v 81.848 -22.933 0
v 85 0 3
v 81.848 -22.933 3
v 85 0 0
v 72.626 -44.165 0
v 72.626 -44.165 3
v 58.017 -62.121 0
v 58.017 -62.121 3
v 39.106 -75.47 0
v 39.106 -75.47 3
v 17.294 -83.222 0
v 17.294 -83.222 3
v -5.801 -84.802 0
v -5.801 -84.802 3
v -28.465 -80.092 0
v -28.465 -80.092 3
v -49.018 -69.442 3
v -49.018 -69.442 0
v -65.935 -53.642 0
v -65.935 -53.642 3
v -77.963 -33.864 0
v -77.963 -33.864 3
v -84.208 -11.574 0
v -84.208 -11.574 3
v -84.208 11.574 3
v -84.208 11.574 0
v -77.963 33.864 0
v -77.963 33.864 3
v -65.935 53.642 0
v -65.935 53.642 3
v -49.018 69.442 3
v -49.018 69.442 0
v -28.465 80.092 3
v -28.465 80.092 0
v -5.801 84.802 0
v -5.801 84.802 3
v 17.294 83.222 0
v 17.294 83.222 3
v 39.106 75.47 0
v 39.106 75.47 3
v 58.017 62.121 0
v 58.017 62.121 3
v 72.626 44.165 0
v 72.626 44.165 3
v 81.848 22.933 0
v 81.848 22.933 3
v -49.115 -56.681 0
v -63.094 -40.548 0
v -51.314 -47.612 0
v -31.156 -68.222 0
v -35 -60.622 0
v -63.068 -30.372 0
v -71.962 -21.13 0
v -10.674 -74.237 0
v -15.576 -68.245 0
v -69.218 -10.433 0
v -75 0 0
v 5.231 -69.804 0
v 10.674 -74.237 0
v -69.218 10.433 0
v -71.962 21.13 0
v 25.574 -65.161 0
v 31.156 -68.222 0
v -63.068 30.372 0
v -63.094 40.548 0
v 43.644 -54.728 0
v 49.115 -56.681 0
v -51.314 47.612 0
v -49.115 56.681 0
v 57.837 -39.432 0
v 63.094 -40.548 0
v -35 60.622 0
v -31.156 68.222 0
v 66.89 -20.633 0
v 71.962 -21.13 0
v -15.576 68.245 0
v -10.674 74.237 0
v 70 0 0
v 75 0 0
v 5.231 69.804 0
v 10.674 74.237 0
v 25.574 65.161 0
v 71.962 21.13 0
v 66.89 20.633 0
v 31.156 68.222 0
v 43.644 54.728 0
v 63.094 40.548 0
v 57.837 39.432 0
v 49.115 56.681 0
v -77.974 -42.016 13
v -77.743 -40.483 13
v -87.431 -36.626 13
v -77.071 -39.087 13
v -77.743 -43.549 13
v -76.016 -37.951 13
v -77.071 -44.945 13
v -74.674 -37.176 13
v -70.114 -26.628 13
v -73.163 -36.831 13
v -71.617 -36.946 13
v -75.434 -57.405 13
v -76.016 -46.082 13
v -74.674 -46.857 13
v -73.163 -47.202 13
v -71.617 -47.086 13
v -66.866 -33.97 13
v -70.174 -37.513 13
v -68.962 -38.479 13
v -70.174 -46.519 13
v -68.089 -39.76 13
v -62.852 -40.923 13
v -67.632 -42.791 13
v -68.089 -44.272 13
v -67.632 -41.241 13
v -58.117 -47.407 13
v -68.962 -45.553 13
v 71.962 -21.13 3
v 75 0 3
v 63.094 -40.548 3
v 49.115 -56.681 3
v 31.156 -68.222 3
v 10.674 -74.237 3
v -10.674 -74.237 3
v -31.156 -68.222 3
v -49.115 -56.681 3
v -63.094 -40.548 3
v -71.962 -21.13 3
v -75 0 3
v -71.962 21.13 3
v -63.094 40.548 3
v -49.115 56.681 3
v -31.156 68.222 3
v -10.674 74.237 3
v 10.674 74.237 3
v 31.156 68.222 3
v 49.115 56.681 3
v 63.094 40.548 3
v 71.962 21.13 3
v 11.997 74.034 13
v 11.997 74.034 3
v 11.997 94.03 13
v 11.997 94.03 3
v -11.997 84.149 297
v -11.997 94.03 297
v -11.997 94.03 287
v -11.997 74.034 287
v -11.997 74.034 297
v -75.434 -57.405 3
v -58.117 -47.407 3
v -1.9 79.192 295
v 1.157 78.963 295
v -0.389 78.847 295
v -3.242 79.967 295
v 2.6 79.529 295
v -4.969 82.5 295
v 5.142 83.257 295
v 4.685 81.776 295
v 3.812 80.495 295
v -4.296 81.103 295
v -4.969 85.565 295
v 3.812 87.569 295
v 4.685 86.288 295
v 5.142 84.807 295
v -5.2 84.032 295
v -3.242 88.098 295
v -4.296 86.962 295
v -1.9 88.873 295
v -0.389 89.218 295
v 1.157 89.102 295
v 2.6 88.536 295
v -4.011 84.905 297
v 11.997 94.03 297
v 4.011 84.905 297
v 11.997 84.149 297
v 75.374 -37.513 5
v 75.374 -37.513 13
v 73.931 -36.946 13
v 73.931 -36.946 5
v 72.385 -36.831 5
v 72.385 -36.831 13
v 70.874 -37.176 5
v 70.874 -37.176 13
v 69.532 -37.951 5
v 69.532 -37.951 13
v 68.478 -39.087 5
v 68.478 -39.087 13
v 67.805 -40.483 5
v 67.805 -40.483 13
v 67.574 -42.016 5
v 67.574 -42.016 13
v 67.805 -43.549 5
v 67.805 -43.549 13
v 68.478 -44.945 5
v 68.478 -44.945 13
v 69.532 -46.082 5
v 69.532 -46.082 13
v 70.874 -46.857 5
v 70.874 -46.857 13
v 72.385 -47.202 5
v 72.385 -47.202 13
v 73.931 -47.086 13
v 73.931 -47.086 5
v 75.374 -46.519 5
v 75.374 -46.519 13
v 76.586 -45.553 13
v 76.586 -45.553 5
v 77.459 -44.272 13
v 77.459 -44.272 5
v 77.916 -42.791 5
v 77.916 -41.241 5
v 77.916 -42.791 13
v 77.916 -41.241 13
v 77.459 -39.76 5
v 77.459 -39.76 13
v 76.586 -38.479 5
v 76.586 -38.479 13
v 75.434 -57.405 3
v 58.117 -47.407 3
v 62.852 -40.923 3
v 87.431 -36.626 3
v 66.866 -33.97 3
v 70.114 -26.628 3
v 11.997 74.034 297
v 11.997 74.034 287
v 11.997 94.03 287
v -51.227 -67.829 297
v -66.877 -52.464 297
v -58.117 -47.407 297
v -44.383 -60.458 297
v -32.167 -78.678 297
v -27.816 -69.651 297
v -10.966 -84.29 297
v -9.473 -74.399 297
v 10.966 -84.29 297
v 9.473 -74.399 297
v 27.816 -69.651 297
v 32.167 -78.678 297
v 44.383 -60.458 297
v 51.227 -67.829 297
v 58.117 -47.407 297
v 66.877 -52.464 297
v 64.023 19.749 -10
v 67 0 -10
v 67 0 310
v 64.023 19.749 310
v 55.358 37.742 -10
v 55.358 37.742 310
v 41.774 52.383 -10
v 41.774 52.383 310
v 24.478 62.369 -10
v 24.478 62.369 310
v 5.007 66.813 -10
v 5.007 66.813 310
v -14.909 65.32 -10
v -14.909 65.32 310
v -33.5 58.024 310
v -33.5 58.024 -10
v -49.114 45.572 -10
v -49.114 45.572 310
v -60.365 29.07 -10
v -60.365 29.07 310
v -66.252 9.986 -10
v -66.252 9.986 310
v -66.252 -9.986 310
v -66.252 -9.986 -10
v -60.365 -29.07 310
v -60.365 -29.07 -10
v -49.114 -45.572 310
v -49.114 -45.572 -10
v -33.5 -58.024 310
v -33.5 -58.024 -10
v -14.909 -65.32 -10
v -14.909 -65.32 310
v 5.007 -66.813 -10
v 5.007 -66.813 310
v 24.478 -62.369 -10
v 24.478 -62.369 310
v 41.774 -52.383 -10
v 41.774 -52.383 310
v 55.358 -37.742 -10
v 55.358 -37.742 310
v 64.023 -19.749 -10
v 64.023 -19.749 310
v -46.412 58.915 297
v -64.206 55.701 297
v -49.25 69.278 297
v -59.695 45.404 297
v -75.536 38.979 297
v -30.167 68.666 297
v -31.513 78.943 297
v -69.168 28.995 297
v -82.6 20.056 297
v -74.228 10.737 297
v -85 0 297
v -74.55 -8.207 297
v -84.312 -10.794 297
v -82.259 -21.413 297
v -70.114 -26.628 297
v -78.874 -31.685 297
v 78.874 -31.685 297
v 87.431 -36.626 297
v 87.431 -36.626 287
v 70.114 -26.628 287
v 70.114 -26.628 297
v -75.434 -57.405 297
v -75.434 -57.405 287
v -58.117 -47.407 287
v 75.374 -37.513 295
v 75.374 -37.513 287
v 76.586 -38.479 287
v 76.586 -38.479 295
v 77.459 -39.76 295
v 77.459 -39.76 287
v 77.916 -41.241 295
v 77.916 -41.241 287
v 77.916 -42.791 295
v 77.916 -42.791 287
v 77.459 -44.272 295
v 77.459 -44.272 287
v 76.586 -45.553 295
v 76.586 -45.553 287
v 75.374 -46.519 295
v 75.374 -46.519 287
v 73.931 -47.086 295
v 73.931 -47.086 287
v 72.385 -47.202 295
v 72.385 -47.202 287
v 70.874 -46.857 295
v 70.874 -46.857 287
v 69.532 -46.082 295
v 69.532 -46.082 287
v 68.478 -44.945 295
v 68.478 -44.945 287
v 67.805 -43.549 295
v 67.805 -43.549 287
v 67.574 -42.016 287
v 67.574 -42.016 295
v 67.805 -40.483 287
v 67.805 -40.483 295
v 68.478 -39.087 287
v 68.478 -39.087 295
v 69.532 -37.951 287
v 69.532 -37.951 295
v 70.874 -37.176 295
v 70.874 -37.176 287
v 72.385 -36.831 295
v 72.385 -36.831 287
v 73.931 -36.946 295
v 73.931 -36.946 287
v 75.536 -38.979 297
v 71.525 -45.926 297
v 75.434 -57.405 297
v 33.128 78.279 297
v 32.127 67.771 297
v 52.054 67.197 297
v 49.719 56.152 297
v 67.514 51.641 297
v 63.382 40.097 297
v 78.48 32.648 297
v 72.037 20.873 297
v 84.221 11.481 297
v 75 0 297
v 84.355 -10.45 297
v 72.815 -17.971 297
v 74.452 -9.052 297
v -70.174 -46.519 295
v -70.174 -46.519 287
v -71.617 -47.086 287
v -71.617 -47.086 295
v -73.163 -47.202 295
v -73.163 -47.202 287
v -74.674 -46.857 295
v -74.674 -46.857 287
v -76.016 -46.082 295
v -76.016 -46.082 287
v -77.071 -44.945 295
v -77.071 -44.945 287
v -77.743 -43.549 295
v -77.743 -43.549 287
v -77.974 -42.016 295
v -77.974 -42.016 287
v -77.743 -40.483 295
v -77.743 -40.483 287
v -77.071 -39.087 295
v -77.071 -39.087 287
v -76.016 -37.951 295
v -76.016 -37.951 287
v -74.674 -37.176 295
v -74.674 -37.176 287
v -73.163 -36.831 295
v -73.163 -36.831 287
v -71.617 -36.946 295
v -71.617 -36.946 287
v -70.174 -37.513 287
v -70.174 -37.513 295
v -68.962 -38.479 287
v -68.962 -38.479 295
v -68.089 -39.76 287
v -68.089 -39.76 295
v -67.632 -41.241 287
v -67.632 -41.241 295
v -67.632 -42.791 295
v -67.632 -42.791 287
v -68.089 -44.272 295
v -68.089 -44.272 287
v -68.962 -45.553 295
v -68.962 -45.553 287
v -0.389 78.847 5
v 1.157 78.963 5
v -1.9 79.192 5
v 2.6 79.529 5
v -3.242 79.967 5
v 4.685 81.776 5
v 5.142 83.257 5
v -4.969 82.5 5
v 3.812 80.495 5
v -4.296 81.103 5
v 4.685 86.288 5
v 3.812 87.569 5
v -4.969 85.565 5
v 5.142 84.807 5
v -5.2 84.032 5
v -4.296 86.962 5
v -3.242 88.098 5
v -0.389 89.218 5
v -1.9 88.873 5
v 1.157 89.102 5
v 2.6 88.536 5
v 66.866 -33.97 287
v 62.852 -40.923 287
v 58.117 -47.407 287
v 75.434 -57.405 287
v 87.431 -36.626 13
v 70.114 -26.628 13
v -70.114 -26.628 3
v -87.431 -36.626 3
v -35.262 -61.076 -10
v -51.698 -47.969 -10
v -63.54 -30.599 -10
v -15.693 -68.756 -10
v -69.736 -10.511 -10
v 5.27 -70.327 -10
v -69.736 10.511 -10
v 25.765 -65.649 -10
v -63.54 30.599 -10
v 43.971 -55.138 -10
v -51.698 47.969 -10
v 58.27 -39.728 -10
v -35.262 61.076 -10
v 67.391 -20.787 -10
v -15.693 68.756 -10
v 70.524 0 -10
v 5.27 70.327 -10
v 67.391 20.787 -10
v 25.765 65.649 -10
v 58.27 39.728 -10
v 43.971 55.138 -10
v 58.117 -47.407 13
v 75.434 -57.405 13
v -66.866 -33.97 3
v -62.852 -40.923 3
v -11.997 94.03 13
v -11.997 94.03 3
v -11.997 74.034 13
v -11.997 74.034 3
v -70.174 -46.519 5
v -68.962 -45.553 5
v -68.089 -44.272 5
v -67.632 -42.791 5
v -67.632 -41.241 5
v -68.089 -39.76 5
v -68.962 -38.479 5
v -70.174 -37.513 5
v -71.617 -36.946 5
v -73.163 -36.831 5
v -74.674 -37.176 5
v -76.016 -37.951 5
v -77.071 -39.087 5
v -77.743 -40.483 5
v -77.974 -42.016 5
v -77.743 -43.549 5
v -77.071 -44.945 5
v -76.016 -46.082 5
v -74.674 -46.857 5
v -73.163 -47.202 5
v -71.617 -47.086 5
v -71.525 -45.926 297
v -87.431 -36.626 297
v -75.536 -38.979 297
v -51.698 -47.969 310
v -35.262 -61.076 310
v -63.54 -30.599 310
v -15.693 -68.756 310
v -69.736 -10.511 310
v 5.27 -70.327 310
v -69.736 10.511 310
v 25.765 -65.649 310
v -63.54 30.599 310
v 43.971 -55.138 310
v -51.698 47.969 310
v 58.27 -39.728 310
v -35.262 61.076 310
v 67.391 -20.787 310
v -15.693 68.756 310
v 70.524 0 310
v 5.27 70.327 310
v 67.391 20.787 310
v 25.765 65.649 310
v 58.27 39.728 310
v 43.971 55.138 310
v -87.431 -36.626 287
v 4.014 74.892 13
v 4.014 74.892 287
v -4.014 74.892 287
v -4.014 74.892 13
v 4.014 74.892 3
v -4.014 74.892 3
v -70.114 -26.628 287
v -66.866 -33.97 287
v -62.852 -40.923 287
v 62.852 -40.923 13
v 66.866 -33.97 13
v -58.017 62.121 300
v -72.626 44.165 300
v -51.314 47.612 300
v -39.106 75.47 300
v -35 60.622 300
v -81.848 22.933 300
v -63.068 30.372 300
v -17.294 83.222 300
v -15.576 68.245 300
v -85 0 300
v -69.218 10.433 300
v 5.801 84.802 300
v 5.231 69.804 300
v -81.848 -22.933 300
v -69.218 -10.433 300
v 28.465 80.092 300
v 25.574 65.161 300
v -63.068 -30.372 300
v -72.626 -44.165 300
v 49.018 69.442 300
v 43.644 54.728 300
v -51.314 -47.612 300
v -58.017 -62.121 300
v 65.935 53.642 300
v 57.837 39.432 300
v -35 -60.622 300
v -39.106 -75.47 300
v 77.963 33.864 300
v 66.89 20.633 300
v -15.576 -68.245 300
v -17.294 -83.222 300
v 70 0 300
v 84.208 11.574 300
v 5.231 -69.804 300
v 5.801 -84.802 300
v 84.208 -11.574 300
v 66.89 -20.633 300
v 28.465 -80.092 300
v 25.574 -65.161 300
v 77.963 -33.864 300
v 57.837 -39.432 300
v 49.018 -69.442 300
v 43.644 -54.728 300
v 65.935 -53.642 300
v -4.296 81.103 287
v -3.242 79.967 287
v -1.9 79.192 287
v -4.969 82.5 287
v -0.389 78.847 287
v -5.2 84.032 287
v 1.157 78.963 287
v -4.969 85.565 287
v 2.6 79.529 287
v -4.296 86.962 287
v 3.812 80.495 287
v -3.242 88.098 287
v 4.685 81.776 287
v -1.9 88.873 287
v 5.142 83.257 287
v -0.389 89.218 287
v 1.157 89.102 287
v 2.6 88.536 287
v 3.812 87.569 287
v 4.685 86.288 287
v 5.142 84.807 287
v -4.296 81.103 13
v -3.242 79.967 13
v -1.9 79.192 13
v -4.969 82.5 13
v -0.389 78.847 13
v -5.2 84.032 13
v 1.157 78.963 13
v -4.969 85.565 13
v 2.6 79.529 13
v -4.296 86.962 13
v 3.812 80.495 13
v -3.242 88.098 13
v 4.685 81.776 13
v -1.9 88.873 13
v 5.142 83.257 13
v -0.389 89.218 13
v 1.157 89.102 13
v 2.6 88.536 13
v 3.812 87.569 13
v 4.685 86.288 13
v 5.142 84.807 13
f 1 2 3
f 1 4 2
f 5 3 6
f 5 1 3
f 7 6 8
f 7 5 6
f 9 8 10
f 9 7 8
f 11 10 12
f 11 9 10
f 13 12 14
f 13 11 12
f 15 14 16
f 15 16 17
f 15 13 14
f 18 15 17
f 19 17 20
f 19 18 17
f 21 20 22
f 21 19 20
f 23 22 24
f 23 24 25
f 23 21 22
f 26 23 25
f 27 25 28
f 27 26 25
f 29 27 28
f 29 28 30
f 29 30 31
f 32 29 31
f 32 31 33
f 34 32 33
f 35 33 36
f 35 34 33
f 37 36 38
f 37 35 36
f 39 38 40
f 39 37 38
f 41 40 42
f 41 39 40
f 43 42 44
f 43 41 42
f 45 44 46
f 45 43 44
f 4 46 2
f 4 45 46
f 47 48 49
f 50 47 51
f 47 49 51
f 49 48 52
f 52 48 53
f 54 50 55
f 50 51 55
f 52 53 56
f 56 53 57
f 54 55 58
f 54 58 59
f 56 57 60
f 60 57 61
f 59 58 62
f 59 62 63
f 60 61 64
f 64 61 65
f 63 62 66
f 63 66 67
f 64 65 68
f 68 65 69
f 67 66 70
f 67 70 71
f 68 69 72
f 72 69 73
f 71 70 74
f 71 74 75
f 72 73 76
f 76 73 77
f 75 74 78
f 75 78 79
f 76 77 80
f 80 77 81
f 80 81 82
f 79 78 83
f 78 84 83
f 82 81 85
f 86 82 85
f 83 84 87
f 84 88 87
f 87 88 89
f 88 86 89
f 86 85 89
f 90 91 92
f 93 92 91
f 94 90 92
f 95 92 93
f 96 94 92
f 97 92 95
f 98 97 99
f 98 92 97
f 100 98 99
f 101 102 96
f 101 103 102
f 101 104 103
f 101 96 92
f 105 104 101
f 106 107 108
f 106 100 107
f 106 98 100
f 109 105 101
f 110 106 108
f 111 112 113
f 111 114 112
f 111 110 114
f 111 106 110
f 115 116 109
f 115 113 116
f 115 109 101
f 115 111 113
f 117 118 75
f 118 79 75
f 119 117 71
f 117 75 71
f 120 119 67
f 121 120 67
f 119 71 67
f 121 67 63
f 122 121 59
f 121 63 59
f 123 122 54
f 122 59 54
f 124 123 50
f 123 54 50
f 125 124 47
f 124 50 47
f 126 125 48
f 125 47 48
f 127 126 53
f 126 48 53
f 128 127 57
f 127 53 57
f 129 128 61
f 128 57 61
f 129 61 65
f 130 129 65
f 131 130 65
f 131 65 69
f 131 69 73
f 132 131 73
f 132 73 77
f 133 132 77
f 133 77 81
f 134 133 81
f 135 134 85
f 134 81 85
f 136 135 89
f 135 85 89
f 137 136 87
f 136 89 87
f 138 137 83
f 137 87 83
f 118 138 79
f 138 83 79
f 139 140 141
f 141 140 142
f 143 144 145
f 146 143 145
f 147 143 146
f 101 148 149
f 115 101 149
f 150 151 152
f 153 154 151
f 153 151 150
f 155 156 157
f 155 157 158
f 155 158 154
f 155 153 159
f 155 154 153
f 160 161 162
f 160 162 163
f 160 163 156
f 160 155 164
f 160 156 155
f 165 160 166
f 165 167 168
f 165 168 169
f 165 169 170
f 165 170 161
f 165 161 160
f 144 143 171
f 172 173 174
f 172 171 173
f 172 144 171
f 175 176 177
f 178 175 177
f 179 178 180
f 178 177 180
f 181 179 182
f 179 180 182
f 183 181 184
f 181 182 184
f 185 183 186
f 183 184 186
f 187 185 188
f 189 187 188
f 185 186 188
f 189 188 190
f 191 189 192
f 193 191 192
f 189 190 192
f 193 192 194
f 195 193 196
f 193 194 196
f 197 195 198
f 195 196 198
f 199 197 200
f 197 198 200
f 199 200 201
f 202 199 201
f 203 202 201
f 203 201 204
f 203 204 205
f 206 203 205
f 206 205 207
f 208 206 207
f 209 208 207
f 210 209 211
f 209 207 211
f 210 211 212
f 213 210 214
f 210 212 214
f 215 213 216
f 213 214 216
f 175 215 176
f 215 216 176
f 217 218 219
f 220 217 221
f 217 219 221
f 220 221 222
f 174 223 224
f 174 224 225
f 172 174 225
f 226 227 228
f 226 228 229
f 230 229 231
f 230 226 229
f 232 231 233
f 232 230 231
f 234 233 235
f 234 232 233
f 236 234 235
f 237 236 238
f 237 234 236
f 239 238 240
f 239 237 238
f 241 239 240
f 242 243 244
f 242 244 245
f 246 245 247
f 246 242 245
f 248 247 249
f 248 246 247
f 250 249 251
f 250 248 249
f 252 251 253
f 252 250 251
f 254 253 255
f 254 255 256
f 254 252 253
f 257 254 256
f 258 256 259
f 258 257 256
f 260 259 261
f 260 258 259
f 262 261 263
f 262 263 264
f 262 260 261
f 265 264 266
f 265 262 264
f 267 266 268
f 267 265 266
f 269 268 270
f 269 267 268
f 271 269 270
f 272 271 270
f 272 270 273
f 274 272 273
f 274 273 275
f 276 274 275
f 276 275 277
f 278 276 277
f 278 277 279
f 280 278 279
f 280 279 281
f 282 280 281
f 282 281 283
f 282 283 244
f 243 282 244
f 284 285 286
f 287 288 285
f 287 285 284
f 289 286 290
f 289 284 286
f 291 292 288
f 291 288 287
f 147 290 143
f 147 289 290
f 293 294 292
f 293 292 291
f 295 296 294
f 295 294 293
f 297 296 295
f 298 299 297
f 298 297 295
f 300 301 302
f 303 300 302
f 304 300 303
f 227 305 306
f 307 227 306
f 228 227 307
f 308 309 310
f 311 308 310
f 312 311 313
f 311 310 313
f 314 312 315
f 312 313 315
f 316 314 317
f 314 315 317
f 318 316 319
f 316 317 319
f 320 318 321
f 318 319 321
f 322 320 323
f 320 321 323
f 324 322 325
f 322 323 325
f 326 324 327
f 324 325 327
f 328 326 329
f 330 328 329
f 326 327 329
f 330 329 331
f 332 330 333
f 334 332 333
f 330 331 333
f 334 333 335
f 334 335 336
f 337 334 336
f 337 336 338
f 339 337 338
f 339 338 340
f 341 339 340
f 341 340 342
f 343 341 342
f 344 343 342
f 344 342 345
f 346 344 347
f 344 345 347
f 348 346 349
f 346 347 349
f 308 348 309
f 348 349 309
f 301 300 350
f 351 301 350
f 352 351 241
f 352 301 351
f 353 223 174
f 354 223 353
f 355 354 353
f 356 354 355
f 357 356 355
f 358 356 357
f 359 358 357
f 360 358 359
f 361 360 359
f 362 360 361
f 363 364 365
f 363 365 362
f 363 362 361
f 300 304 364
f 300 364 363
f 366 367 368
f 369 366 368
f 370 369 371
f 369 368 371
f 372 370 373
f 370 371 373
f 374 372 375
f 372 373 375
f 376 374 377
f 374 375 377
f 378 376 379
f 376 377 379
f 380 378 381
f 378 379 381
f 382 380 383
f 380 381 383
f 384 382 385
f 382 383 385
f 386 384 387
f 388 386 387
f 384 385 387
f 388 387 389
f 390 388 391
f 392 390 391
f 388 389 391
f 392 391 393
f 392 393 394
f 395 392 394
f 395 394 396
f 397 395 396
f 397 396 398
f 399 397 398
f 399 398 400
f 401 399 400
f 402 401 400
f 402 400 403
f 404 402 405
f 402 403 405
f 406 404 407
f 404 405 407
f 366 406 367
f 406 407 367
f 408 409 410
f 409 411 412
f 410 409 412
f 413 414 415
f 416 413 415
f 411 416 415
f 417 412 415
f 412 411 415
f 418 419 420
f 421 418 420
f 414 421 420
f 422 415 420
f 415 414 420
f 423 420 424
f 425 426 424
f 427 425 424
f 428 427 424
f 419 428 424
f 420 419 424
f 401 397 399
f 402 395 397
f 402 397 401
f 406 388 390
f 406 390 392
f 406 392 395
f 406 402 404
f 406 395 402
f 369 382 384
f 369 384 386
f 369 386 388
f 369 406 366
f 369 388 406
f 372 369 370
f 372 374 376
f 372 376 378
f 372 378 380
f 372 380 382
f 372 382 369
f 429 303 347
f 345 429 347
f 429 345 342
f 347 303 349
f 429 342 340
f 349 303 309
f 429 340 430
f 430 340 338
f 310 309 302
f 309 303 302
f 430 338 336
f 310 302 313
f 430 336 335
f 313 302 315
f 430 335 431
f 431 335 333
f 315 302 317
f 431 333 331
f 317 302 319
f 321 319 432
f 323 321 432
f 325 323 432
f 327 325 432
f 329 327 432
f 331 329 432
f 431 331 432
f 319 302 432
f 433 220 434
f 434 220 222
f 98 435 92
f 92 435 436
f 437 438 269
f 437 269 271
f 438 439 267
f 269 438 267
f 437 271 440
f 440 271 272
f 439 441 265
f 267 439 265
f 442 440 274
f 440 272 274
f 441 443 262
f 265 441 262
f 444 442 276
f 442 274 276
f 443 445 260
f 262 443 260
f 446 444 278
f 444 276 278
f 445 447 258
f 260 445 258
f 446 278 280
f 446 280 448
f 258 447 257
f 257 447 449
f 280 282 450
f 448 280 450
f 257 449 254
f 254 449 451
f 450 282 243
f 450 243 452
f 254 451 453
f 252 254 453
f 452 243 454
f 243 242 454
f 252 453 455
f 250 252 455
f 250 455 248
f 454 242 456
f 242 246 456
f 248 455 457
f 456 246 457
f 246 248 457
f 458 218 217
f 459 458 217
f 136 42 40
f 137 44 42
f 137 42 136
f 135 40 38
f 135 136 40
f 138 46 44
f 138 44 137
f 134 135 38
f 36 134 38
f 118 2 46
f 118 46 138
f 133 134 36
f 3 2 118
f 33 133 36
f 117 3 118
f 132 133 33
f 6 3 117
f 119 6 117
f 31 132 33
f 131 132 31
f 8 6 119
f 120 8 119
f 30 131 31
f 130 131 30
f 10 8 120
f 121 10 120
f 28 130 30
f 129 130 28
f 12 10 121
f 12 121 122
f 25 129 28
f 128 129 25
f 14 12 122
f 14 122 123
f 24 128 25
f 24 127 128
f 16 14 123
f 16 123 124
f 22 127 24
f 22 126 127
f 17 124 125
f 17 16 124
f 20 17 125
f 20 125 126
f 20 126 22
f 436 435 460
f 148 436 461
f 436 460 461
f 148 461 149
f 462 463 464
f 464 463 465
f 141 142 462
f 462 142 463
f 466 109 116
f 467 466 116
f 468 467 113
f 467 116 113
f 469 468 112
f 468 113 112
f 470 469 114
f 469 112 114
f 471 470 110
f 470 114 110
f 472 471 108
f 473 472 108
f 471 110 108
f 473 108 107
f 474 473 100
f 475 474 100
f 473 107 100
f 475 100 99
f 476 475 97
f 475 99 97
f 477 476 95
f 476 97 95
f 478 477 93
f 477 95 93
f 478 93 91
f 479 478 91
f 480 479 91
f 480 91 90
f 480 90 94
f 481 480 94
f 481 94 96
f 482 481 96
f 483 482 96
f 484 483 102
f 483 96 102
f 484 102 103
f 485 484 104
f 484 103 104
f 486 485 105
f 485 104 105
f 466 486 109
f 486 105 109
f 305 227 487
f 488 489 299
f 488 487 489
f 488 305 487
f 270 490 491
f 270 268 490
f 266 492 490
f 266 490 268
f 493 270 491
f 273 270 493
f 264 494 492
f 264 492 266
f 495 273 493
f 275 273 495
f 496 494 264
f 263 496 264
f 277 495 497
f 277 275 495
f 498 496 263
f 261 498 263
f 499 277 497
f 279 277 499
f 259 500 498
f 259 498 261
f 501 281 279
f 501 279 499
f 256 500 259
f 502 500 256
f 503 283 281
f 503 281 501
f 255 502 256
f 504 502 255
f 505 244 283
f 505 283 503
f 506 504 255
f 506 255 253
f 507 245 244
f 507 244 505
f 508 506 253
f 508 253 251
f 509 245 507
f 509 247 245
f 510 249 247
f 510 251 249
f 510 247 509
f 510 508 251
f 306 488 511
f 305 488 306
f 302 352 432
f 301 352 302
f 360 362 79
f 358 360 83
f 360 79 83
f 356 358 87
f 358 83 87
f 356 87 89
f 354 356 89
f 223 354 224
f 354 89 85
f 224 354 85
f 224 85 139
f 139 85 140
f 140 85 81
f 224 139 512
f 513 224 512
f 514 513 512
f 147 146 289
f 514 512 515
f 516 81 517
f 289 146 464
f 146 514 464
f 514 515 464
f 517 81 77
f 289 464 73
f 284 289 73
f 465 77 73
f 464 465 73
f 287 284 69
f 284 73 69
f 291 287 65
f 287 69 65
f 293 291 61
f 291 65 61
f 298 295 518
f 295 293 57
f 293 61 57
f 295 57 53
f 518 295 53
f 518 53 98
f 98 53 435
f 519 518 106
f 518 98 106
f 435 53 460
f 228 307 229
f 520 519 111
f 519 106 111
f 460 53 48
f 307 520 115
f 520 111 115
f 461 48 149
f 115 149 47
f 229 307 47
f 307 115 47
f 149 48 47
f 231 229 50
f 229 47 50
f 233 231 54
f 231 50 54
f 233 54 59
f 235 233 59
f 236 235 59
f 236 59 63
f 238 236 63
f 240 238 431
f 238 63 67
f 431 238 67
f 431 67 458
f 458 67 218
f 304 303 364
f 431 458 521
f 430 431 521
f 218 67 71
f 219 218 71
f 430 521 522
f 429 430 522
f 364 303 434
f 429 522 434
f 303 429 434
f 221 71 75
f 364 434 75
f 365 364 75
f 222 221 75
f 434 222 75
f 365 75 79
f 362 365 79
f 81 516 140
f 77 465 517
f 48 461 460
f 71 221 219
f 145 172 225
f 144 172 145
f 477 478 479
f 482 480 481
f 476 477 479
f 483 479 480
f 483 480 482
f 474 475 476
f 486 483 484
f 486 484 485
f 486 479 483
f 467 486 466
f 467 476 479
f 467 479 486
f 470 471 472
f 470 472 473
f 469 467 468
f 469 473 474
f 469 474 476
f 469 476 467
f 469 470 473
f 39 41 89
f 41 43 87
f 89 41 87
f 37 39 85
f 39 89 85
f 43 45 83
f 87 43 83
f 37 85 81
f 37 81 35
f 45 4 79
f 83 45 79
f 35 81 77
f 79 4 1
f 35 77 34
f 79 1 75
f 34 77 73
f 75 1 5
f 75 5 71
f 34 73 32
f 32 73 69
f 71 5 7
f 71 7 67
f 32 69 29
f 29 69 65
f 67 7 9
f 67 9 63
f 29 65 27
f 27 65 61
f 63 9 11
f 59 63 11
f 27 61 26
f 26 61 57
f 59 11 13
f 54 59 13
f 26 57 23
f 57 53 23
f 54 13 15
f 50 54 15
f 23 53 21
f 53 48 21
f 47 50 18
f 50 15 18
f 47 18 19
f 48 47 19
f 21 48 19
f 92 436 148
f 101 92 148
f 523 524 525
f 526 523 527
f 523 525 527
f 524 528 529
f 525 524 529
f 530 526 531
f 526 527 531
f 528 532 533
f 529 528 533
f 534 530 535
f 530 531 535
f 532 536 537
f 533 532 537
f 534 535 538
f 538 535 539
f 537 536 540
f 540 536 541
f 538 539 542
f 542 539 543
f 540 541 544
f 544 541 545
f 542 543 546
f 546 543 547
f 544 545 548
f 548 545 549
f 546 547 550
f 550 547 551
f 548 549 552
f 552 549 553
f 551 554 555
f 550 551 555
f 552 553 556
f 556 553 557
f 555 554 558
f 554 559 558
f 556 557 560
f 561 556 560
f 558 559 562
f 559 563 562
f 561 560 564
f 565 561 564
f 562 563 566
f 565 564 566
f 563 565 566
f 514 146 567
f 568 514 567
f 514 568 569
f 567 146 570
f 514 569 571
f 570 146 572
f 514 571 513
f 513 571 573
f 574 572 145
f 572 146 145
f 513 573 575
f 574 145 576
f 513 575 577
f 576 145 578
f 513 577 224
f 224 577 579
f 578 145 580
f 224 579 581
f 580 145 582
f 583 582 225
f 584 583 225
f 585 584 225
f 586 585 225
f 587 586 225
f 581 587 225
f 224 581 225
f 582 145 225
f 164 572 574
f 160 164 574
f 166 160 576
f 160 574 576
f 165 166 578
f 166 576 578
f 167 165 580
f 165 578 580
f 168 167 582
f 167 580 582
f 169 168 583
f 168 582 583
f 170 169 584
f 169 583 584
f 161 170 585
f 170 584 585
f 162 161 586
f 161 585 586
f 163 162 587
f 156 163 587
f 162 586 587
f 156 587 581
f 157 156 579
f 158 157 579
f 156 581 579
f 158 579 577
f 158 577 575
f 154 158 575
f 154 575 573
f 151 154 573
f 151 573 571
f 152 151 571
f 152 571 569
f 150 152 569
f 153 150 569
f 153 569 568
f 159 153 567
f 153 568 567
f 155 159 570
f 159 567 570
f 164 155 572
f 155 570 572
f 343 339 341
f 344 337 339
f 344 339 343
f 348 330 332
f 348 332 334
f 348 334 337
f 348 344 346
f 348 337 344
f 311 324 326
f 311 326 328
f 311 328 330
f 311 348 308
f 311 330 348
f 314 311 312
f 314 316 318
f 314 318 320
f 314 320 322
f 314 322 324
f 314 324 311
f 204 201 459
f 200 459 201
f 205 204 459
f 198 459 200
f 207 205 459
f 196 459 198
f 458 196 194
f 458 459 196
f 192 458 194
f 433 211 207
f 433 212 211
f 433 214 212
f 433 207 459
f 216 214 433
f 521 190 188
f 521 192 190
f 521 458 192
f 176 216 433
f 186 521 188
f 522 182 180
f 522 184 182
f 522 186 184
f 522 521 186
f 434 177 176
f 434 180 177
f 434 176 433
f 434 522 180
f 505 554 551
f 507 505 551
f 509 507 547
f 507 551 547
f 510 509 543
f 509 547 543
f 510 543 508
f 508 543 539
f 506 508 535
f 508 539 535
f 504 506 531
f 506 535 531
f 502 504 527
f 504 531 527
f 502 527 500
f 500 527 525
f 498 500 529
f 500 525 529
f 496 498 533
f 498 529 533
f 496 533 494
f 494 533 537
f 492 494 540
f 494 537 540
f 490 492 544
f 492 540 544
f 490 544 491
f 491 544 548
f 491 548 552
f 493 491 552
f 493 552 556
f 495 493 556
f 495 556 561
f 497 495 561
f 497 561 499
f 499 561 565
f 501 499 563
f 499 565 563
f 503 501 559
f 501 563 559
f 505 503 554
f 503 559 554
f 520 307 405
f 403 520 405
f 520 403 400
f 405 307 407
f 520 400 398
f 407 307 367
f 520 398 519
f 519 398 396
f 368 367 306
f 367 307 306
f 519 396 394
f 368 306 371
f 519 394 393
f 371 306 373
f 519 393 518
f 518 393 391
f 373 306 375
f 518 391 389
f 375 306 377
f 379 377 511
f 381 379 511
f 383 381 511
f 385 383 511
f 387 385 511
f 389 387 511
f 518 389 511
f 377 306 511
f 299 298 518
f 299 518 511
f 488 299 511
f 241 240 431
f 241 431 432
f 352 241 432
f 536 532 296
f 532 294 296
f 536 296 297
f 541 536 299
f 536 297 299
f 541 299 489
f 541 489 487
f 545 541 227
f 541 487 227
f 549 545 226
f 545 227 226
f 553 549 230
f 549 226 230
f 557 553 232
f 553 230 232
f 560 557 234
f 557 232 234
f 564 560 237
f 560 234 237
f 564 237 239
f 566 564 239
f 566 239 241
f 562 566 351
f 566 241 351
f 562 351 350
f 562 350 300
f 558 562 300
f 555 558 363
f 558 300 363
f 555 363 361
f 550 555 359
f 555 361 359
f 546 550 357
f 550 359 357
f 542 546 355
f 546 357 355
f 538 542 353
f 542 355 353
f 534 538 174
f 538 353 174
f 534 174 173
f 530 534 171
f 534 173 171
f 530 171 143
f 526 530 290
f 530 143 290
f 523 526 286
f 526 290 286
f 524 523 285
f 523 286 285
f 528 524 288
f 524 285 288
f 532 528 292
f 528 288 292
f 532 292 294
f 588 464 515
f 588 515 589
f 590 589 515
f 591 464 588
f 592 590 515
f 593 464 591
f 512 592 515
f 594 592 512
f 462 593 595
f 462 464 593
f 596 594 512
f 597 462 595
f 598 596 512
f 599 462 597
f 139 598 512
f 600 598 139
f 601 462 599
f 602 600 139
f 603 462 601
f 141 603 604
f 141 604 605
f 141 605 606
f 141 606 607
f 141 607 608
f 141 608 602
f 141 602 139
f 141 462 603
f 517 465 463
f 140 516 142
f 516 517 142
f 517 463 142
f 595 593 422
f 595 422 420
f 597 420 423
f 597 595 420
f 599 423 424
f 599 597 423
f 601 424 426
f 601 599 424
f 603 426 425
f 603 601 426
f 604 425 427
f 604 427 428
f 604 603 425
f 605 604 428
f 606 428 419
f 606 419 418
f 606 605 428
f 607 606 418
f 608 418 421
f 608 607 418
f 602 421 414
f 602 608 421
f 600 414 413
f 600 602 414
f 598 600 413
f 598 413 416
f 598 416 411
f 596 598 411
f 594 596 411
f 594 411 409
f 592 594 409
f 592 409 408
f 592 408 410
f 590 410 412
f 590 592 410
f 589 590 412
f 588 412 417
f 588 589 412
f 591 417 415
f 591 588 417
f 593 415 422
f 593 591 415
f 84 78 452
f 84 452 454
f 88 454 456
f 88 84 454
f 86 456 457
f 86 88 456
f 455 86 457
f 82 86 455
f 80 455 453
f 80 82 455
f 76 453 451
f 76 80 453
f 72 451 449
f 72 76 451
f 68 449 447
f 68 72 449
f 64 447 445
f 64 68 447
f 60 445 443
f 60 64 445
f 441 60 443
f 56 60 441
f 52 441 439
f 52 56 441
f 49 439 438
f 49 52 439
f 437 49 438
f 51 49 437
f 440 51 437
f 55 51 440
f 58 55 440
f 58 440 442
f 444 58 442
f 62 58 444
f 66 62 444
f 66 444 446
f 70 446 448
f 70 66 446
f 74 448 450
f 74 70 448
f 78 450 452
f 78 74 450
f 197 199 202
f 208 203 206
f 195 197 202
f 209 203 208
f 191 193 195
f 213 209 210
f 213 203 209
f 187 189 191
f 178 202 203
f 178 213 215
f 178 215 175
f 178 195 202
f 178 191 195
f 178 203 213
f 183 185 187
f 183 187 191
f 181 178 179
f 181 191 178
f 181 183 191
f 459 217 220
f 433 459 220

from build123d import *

# Parameters (mm, degrees)
SKETCH3_R                         = 75
MAIN_BODY_DEPTH                   = 300
SKETCH16_R                        = 70
EXTENSION_1_DEPTH                 = 10
EXTENSION_1_DRAFT                 = -3
SKETCH23_R                        = 67
CUT_EXTRUDE11_DEPTH               = 333
SKETCH35_W                        = 3
SKETCH35_H                        = 10
SKETCH37_W                        = 3
SKETCH37_H                        = 10
SKETCH46_R                        = 70
EXTENSION_2_DEPTH                 = 10
EXTENSION_2_DRAFT                 = 3
CUT_EXTRUDE16_DEPTH               = 34
CUT_EXTRUDE16_DEPTH_BACK          = 64
SKETCH47_R                        = 67
RODEHOLDER_DEPTH                  = 10
SKETCH55_R                        = 5.2
RODEHOLDERHOLE_DEPTH              = 8
RODEHOLDERPATTERN_COUNT           = 3
RODEHOLDERPATTERN_COPY_1_DEPTH    = 10
RODEHOLDERPATTERN_COPY_2_DEPTH    = 10
RODEHOLDERPATTERN_COPY_3_SKETCH_R = 5.2
RODEHOLDERPATTERN_COPY_3_DEPTH    = 8
RODEHOLDERPATTERN_COPY_4_SKETCH_R = 5.2
RODEHOLDERPATTERN_COPY_4_DEPTH    = 8


with BuildPart() as part:
    # Sketch3 → Main Body (new body)
    with BuildSketch(Plane.XY):
        Circle(SKETCH3_R)
    extrude(amount=MAIN_BODY_DEPTH)


with BuildPart() as extension_1_tool:
    # Sketch16 → Extension 1 (with draft: the straight prism first)
    with BuildSketch(Plane.XY.offset(300)):
        Circle(SKETCH16_R)
    extrude(amount=EXTENSION_1_DEPTH)
    # Extension 1: the draft: its side faces are tilted about the plane it starts from
    extension_1_sides = [extension_1_tool.faces().sort_by_distance(p)[0] for p in [
        (-70, 0, 305),
    ]]
    draft(extension_1_sides, Plane.XY.offset(300), EXTENSION_1_DRAFT)


with BuildPart() as part_1:
    add(part.part)

    # Extension 1: add extension_1_tool
    add(extension_1_tool.part)

    # Sketch23 → Cut-Extrude11 (cut)
    with BuildSketch(Plane.XY.offset(310)):
        Circle(SKETCH23_R)
    extrude(amount=-CUT_EXTRUDE11_DEPTH, mode=Mode.SUBTRACT)


with BuildPart() as body_2:
    # Sketch35 → Revolve7 (revolve)
    with BuildSketch(Plane(origin=(0, 0, 0), x_dir=(0, 0, -1), z_dir=(1, 0, 0)), mode=Mode.PRIVATE) as revolve7_sk:
        with Locations((-298.5, 80)):
            Rectangle(SKETCH35_W, SKETCH35_H)
    revolve(revolve7_sk.sketch.rotate(Axis((0, 0, -28.786578701), (0, 0, 1)), 90), axis=Axis((0, 0, -28.786578701), (0, 0, 1)))


with BuildPart() as body_3:
    # Sketch37 → Revolve11 (revolve)
    with BuildSketch(Plane(origin=(0, 0, 0), x_dir=(0, 0, -1), z_dir=(1, 0, 0)), mode=Mode.PRIVATE) as revolve11_sk:
        with Locations((-1.5, 80)):
            Rectangle(SKETCH37_W, SKETCH37_H)
    revolve(revolve11_sk.sketch.rotate(Axis((0, 0, 339.578392978), (0, 0, -1)), 90), axis=Axis((0, 0, 339.578392978), (0, 0, -1)))


with BuildPart() as extension_2_tool:
    # Sketch46 → Extension 2 (with draft: the straight prism first)
    with BuildSketch(Plane.XY):
        Circle(SKETCH46_R)
    extrude(amount=-EXTENSION_2_DEPTH)
    # Extension 2: the draft: its side faces are tilted about the plane it starts from
    extension_2_sides = [extension_2_tool.faces().sort_by_distance(p)[0] for p in [
        (-70, 0, -5),
    ]]
    draft(extension_2_sides, Plane.XY, EXTENSION_2_DRAFT)


with BuildPart() as part_2:
    add(part_1.part)

    # Extension 2: add extension_2_tool
    add(extension_2_tool.part)

    # Sketch47 → Cut-Extrude16 (cut, two sides: drawn at the far end of the back side and taken through both)
    with BuildSketch(Plane.XY.offset(-CUT_EXTRUDE16_DEPTH_BACK)):
        Circle(SKETCH47_R)
    extrude(amount=CUT_EXTRUDE16_DEPTH + CUT_EXTRUDE16_DEPTH_BACK, mode=Mode.SUBTRACT)


    add(body_2.part)  # RodeHolder merges body 2
    # Sketch49 → RodeHolder (add)
    with BuildSketch(Plane.XY.offset(297)):
        with BuildLine():
            ThreePointArc((-11.996756975, 74.030191347), (-6.017946224, 74.757153125), (0, 75.00000014))
            ThreePointArc((0, 75.00000014), (6.017946224, 74.757153125), (11.996756975, 74.030191347))
            Line((11.996756975, 74.030191347), (11.996756975, 94.030191347))
            Line((11.996756975, 94.030191347), (-11.996756975, 94.030191347))
            Line((-11.996756975, 94.030191347), (-11.996756975, 74.030191347))
        make_face()
    rodeholder = extrude(amount=-RODEHOLDER_DEPTH)

    # Sketch55 → RodeHolderHole (cut)
    with BuildSketch(Plane(origin=(0, 0, 287), x_dir=(-1, 0, 0), z_dir=(0, 0, -1))):
        with Locations((0, 84.032246503)):
            Circle(SKETCH55_R)
    rodeholderhole = extrude(amount=-RODEHOLDERHOLE_DEPTH, mode=Mode.SUBTRACT)

    # RodeHolderMirror: RodeHolder across plane
    add(rodeholder.mirror(Plane.XY.offset(150)))

    # RodeHolderMirror 2: RodeHolderHole across plane
    add(rodeholderhole.mirror(Plane.XY.offset(150)), mode=Mode.SUBTRACT)

    # RodeHolderPattern: RodeHolder, RodeHolderHole ×3 about axis
    rodeholderpattern_axis = Axis((0, 0, 0), (0, 0, 1))
    add([rodeholder.rotate(rodeholderpattern_axis, i * 360 / RODEHOLDERPATTERN_COUNT) for i in range(1, RODEHOLDERPATTERN_COUNT)])
    add([rodeholderhole.rotate(rodeholderpattern_axis, i * 360 / RODEHOLDERPATTERN_COUNT) for i in range(1, RODEHOLDERPATTERN_COUNT)], mode=Mode.SUBTRACT)

    # RodeHolderPattern copy 1 sketch → RodeHolderPattern copy 1 (add)
    with BuildSketch(Plane(origin=(0, 0, 3), x_dir=(-0.4999999999999998, 0.8660254037844387, 0), z_dir=(0, 0, -1))):
        with BuildLine():
            ThreePointArc((-11.996756975, -74.030191347), (-6.017946224, -74.757153125), (0, -75.00000014))
            ThreePointArc((0, -75.00000014), (6.017946224, -74.757153125), (11.996756975, -74.030191347))
            Line((11.996756975, -74.030191347), (11.996756975, -94.030191347))
            Line((11.996756975, -94.030191347), (-11.996756975, -94.030191347))
            Line((-11.996756975, -94.030191347), (-11.996756975, -74.030191347))
        make_face()
    extrude(amount=-RODEHOLDERPATTERN_COPY_1_DEPTH)

    # RodeHolderPattern copy 2 sketch → RodeHolderPattern copy 2 (add)
    with BuildSketch(Plane(origin=(0, 0, 3), x_dir=(-0.5000000000000004, -0.8660254037844384, 0), z_dir=(0, 0, -1))):
        with BuildLine():
            ThreePointArc((-11.996756975, -74.030191347), (-6.017946224, -74.757153125), (0, -75.00000014))
            ThreePointArc((0, -75.00000014), (6.017946224, -74.757153125), (11.996756975, -74.030191347))
            Line((11.996756975, -74.030191347), (11.996756975, -94.030191347))
            Line((11.996756975, -94.030191347), (-11.996756975, -94.030191347))
            Line((-11.996756975, -94.030191347), (-11.996756975, -74.030191347))
        make_face()
    extrude(amount=-RODEHOLDERPATTERN_COPY_2_DEPTH)

    # RodeHolderPattern copy 3 sketch → RodeHolderPattern copy 3 (cut)
    with BuildSketch(Plane(origin=(0, 0, 13), x_dir=(0.4999999999999998, -0.8660254037844387, 0), z_dir=(0, 0, 1))):
        with Locations((0, -84.032246503)):
            Circle(RODEHOLDERPATTERN_COPY_3_SKETCH_R)
    extrude(amount=-RODEHOLDERPATTERN_COPY_3_DEPTH, mode=Mode.SUBTRACT)

    # RodeHolderPattern copy 4 sketch → RodeHolderPattern copy 4 (cut)
    with BuildSketch(Plane(origin=(0, 0, 13), x_dir=(0.5000000000000004, 0.8660254037844384, 0), z_dir=(0, 0, 1))):
        with Locations((0, -84.032246503)):
            Circle(RODEHOLDERPATTERN_COPY_4_SKETCH_R)
    extrude(amount=-RODEHOLDERPATTERN_COPY_4_DEPTH, mode=Mode.SUBTRACT)


solid = Compound([body_3.part, part_2.part])
